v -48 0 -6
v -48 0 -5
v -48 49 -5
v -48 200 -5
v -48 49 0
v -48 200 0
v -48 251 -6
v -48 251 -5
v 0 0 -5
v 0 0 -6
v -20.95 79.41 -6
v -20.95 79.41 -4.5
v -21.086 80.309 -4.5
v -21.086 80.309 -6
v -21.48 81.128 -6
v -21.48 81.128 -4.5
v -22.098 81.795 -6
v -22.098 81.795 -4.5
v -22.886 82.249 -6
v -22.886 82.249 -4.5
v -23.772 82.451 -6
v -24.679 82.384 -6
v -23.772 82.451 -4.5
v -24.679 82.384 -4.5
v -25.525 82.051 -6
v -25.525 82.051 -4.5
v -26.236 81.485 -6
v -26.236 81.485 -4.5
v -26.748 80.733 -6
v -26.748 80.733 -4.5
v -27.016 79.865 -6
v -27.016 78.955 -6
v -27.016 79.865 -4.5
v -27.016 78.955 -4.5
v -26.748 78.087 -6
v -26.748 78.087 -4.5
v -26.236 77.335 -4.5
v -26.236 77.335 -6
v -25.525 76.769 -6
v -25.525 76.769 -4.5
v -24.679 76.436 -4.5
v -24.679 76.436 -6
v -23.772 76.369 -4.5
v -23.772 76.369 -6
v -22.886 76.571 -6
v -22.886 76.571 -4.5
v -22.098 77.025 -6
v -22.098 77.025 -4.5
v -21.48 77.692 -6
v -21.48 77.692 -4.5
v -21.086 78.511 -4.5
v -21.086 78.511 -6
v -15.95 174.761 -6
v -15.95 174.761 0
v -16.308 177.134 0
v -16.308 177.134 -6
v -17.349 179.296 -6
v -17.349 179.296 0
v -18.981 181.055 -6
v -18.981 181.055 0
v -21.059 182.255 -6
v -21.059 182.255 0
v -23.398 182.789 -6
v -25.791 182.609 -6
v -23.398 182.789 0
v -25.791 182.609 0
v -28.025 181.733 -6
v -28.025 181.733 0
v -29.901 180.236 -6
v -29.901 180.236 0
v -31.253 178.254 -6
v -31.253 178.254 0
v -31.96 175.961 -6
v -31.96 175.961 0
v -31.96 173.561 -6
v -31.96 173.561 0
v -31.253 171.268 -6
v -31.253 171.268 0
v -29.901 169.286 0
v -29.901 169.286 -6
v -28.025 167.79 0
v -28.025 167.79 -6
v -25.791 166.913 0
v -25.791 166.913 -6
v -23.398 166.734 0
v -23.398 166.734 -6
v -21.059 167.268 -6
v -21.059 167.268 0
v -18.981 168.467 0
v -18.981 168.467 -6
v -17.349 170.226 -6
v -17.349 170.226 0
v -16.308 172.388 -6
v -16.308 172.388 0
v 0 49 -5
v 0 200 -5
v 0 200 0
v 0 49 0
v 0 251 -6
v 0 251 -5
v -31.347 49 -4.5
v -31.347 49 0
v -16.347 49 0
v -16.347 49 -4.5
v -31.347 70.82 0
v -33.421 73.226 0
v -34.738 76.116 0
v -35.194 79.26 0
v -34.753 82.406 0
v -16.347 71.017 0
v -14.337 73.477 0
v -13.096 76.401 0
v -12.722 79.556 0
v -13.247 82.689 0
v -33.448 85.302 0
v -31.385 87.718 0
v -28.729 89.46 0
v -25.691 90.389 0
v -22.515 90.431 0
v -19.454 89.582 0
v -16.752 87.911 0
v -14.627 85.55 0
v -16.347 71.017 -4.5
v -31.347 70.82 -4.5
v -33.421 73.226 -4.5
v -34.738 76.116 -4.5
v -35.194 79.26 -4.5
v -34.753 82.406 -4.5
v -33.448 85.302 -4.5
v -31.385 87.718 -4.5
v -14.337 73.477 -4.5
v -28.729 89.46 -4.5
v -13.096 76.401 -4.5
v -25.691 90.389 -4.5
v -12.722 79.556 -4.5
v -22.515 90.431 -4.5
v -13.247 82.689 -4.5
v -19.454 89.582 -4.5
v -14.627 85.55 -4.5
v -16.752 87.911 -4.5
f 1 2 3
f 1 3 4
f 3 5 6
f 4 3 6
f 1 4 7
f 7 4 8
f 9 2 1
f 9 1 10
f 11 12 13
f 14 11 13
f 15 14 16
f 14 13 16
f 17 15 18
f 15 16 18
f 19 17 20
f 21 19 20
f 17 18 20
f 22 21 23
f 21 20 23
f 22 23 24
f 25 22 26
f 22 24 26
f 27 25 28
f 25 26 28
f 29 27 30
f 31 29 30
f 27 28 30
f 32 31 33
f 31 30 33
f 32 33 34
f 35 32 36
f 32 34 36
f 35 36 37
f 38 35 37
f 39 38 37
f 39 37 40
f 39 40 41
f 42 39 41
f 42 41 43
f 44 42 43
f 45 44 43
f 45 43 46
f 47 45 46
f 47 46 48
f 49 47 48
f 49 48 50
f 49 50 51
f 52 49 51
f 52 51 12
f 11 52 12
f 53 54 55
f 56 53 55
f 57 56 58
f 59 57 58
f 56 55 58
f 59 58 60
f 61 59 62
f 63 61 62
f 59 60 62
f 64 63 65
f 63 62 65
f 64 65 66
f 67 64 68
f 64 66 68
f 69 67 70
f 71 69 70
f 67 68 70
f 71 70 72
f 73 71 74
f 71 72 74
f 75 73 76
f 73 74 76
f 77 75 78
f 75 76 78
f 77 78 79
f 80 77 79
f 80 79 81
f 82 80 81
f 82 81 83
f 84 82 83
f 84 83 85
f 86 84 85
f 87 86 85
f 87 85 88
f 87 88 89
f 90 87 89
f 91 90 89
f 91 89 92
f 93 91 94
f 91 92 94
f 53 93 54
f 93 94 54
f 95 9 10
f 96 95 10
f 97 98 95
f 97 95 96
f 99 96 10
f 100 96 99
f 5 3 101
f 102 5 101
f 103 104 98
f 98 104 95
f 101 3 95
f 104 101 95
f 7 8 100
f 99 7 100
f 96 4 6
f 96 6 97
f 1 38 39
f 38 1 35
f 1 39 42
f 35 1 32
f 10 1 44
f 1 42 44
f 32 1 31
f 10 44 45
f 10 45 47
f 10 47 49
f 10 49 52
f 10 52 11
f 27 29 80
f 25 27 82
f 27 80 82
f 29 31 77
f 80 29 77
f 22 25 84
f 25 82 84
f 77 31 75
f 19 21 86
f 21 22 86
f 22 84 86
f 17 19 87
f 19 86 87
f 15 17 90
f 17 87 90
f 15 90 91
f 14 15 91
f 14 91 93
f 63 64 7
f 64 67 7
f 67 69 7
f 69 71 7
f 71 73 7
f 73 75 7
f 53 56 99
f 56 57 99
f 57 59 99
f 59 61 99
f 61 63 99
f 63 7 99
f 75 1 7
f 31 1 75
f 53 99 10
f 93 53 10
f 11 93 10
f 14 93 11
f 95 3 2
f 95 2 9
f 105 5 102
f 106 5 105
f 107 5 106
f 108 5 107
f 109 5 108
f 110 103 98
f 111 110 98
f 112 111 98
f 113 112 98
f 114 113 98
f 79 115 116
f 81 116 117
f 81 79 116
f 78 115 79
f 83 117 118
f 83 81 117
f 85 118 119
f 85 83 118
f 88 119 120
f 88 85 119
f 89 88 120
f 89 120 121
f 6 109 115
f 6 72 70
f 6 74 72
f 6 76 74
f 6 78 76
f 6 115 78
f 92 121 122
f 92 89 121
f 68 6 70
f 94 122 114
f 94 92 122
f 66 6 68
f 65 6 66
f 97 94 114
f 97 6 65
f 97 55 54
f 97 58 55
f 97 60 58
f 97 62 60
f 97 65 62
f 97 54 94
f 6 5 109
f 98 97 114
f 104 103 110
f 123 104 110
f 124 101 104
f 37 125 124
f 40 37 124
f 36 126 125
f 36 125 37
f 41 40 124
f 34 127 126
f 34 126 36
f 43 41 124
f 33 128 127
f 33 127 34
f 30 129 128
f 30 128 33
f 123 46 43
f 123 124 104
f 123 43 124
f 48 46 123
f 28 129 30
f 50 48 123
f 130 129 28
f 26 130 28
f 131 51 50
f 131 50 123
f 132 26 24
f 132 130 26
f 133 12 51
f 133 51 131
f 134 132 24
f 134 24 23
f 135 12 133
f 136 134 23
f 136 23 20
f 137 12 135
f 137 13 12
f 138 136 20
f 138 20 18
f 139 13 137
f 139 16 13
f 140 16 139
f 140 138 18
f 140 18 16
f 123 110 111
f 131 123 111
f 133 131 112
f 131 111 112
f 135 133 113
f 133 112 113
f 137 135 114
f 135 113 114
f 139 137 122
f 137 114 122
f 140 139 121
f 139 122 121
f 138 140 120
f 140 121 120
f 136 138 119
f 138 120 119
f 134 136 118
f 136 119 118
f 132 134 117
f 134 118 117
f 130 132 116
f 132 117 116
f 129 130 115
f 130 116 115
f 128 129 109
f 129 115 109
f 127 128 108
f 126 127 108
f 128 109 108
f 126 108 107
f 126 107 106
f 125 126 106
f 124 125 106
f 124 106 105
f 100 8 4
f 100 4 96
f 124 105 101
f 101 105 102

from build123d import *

# Parameters (mm, degrees)
SKETCH_W        = 48
SKETCH_H        = 250.999997
SKETCH_R        = 8.05
SKETCH_R_2      = 3.05
PAD_DEPTH       = 6
POCKET_DEPTH    = 4.5
SKETCH002_W     = 48.1
SKETCH002_H     = 48.999997
POCKET001_DEPTH = 5.001
SKETCH003_W     = 48.1
SKETCH003_H     = 52
POCKET002_DEPTH = 5.001


with BuildPart() as part:
    # Sketch → Pad (new body)
    with BuildSketch(Plane.XY):
        with Locations((-24, 125.499994)):
            Rectangle(SKETCH_W, SKETCH_H)
        with Locations((-24, 174.761047)):
            Circle(SKETCH_R, mode=Mode.SUBTRACT)
        with Locations((-24, 79.409981)):
            Circle(SKETCH_R_2, mode=Mode.SUBTRACT)
    extrude(amount=-PAD_DEPTH)

    # Sketch001 → Pocket (cut)
    with BuildSketch(Plane.XY):
        with BuildLine():
            Line((-31.346662, 47.787562), (-16.346662, 47.787562))
            Line((-16.346662, 47.787562), (-16.346662, 71.017092))
            ThreePointArc((-16.346662, 71.017092), (-24.104532, 90.522743), (-31.346662, 70.819786))
            Line((-31.346662, 70.819786), (-31.346662, 47.787562))
        make_face()
    extrude(amount=-POCKET_DEPTH, mode=Mode.SUBTRACT)

    # Sketch002 → Pocket001 (cut, through all)
    with BuildSketch(Plane.XY.offset(-5)):
        with Locations((-23.95, 24.499994)):
            Rectangle(SKETCH002_W, SKETCH002_H)
    extrude(amount=POCKET001_DEPTH, mode=Mode.SUBTRACT)

    # Sketch003 → Pocket002 (cut, through all)
    with BuildSketch(Plane.XY.offset(-5)):
        with Locations((-23.95, 226)):
            Rectangle(SKETCH003_W, SKETCH003_H)
    extrude(amount=POCKET002_DEPTH, mode=Mode.SUBTRACT)


solid = part.part
